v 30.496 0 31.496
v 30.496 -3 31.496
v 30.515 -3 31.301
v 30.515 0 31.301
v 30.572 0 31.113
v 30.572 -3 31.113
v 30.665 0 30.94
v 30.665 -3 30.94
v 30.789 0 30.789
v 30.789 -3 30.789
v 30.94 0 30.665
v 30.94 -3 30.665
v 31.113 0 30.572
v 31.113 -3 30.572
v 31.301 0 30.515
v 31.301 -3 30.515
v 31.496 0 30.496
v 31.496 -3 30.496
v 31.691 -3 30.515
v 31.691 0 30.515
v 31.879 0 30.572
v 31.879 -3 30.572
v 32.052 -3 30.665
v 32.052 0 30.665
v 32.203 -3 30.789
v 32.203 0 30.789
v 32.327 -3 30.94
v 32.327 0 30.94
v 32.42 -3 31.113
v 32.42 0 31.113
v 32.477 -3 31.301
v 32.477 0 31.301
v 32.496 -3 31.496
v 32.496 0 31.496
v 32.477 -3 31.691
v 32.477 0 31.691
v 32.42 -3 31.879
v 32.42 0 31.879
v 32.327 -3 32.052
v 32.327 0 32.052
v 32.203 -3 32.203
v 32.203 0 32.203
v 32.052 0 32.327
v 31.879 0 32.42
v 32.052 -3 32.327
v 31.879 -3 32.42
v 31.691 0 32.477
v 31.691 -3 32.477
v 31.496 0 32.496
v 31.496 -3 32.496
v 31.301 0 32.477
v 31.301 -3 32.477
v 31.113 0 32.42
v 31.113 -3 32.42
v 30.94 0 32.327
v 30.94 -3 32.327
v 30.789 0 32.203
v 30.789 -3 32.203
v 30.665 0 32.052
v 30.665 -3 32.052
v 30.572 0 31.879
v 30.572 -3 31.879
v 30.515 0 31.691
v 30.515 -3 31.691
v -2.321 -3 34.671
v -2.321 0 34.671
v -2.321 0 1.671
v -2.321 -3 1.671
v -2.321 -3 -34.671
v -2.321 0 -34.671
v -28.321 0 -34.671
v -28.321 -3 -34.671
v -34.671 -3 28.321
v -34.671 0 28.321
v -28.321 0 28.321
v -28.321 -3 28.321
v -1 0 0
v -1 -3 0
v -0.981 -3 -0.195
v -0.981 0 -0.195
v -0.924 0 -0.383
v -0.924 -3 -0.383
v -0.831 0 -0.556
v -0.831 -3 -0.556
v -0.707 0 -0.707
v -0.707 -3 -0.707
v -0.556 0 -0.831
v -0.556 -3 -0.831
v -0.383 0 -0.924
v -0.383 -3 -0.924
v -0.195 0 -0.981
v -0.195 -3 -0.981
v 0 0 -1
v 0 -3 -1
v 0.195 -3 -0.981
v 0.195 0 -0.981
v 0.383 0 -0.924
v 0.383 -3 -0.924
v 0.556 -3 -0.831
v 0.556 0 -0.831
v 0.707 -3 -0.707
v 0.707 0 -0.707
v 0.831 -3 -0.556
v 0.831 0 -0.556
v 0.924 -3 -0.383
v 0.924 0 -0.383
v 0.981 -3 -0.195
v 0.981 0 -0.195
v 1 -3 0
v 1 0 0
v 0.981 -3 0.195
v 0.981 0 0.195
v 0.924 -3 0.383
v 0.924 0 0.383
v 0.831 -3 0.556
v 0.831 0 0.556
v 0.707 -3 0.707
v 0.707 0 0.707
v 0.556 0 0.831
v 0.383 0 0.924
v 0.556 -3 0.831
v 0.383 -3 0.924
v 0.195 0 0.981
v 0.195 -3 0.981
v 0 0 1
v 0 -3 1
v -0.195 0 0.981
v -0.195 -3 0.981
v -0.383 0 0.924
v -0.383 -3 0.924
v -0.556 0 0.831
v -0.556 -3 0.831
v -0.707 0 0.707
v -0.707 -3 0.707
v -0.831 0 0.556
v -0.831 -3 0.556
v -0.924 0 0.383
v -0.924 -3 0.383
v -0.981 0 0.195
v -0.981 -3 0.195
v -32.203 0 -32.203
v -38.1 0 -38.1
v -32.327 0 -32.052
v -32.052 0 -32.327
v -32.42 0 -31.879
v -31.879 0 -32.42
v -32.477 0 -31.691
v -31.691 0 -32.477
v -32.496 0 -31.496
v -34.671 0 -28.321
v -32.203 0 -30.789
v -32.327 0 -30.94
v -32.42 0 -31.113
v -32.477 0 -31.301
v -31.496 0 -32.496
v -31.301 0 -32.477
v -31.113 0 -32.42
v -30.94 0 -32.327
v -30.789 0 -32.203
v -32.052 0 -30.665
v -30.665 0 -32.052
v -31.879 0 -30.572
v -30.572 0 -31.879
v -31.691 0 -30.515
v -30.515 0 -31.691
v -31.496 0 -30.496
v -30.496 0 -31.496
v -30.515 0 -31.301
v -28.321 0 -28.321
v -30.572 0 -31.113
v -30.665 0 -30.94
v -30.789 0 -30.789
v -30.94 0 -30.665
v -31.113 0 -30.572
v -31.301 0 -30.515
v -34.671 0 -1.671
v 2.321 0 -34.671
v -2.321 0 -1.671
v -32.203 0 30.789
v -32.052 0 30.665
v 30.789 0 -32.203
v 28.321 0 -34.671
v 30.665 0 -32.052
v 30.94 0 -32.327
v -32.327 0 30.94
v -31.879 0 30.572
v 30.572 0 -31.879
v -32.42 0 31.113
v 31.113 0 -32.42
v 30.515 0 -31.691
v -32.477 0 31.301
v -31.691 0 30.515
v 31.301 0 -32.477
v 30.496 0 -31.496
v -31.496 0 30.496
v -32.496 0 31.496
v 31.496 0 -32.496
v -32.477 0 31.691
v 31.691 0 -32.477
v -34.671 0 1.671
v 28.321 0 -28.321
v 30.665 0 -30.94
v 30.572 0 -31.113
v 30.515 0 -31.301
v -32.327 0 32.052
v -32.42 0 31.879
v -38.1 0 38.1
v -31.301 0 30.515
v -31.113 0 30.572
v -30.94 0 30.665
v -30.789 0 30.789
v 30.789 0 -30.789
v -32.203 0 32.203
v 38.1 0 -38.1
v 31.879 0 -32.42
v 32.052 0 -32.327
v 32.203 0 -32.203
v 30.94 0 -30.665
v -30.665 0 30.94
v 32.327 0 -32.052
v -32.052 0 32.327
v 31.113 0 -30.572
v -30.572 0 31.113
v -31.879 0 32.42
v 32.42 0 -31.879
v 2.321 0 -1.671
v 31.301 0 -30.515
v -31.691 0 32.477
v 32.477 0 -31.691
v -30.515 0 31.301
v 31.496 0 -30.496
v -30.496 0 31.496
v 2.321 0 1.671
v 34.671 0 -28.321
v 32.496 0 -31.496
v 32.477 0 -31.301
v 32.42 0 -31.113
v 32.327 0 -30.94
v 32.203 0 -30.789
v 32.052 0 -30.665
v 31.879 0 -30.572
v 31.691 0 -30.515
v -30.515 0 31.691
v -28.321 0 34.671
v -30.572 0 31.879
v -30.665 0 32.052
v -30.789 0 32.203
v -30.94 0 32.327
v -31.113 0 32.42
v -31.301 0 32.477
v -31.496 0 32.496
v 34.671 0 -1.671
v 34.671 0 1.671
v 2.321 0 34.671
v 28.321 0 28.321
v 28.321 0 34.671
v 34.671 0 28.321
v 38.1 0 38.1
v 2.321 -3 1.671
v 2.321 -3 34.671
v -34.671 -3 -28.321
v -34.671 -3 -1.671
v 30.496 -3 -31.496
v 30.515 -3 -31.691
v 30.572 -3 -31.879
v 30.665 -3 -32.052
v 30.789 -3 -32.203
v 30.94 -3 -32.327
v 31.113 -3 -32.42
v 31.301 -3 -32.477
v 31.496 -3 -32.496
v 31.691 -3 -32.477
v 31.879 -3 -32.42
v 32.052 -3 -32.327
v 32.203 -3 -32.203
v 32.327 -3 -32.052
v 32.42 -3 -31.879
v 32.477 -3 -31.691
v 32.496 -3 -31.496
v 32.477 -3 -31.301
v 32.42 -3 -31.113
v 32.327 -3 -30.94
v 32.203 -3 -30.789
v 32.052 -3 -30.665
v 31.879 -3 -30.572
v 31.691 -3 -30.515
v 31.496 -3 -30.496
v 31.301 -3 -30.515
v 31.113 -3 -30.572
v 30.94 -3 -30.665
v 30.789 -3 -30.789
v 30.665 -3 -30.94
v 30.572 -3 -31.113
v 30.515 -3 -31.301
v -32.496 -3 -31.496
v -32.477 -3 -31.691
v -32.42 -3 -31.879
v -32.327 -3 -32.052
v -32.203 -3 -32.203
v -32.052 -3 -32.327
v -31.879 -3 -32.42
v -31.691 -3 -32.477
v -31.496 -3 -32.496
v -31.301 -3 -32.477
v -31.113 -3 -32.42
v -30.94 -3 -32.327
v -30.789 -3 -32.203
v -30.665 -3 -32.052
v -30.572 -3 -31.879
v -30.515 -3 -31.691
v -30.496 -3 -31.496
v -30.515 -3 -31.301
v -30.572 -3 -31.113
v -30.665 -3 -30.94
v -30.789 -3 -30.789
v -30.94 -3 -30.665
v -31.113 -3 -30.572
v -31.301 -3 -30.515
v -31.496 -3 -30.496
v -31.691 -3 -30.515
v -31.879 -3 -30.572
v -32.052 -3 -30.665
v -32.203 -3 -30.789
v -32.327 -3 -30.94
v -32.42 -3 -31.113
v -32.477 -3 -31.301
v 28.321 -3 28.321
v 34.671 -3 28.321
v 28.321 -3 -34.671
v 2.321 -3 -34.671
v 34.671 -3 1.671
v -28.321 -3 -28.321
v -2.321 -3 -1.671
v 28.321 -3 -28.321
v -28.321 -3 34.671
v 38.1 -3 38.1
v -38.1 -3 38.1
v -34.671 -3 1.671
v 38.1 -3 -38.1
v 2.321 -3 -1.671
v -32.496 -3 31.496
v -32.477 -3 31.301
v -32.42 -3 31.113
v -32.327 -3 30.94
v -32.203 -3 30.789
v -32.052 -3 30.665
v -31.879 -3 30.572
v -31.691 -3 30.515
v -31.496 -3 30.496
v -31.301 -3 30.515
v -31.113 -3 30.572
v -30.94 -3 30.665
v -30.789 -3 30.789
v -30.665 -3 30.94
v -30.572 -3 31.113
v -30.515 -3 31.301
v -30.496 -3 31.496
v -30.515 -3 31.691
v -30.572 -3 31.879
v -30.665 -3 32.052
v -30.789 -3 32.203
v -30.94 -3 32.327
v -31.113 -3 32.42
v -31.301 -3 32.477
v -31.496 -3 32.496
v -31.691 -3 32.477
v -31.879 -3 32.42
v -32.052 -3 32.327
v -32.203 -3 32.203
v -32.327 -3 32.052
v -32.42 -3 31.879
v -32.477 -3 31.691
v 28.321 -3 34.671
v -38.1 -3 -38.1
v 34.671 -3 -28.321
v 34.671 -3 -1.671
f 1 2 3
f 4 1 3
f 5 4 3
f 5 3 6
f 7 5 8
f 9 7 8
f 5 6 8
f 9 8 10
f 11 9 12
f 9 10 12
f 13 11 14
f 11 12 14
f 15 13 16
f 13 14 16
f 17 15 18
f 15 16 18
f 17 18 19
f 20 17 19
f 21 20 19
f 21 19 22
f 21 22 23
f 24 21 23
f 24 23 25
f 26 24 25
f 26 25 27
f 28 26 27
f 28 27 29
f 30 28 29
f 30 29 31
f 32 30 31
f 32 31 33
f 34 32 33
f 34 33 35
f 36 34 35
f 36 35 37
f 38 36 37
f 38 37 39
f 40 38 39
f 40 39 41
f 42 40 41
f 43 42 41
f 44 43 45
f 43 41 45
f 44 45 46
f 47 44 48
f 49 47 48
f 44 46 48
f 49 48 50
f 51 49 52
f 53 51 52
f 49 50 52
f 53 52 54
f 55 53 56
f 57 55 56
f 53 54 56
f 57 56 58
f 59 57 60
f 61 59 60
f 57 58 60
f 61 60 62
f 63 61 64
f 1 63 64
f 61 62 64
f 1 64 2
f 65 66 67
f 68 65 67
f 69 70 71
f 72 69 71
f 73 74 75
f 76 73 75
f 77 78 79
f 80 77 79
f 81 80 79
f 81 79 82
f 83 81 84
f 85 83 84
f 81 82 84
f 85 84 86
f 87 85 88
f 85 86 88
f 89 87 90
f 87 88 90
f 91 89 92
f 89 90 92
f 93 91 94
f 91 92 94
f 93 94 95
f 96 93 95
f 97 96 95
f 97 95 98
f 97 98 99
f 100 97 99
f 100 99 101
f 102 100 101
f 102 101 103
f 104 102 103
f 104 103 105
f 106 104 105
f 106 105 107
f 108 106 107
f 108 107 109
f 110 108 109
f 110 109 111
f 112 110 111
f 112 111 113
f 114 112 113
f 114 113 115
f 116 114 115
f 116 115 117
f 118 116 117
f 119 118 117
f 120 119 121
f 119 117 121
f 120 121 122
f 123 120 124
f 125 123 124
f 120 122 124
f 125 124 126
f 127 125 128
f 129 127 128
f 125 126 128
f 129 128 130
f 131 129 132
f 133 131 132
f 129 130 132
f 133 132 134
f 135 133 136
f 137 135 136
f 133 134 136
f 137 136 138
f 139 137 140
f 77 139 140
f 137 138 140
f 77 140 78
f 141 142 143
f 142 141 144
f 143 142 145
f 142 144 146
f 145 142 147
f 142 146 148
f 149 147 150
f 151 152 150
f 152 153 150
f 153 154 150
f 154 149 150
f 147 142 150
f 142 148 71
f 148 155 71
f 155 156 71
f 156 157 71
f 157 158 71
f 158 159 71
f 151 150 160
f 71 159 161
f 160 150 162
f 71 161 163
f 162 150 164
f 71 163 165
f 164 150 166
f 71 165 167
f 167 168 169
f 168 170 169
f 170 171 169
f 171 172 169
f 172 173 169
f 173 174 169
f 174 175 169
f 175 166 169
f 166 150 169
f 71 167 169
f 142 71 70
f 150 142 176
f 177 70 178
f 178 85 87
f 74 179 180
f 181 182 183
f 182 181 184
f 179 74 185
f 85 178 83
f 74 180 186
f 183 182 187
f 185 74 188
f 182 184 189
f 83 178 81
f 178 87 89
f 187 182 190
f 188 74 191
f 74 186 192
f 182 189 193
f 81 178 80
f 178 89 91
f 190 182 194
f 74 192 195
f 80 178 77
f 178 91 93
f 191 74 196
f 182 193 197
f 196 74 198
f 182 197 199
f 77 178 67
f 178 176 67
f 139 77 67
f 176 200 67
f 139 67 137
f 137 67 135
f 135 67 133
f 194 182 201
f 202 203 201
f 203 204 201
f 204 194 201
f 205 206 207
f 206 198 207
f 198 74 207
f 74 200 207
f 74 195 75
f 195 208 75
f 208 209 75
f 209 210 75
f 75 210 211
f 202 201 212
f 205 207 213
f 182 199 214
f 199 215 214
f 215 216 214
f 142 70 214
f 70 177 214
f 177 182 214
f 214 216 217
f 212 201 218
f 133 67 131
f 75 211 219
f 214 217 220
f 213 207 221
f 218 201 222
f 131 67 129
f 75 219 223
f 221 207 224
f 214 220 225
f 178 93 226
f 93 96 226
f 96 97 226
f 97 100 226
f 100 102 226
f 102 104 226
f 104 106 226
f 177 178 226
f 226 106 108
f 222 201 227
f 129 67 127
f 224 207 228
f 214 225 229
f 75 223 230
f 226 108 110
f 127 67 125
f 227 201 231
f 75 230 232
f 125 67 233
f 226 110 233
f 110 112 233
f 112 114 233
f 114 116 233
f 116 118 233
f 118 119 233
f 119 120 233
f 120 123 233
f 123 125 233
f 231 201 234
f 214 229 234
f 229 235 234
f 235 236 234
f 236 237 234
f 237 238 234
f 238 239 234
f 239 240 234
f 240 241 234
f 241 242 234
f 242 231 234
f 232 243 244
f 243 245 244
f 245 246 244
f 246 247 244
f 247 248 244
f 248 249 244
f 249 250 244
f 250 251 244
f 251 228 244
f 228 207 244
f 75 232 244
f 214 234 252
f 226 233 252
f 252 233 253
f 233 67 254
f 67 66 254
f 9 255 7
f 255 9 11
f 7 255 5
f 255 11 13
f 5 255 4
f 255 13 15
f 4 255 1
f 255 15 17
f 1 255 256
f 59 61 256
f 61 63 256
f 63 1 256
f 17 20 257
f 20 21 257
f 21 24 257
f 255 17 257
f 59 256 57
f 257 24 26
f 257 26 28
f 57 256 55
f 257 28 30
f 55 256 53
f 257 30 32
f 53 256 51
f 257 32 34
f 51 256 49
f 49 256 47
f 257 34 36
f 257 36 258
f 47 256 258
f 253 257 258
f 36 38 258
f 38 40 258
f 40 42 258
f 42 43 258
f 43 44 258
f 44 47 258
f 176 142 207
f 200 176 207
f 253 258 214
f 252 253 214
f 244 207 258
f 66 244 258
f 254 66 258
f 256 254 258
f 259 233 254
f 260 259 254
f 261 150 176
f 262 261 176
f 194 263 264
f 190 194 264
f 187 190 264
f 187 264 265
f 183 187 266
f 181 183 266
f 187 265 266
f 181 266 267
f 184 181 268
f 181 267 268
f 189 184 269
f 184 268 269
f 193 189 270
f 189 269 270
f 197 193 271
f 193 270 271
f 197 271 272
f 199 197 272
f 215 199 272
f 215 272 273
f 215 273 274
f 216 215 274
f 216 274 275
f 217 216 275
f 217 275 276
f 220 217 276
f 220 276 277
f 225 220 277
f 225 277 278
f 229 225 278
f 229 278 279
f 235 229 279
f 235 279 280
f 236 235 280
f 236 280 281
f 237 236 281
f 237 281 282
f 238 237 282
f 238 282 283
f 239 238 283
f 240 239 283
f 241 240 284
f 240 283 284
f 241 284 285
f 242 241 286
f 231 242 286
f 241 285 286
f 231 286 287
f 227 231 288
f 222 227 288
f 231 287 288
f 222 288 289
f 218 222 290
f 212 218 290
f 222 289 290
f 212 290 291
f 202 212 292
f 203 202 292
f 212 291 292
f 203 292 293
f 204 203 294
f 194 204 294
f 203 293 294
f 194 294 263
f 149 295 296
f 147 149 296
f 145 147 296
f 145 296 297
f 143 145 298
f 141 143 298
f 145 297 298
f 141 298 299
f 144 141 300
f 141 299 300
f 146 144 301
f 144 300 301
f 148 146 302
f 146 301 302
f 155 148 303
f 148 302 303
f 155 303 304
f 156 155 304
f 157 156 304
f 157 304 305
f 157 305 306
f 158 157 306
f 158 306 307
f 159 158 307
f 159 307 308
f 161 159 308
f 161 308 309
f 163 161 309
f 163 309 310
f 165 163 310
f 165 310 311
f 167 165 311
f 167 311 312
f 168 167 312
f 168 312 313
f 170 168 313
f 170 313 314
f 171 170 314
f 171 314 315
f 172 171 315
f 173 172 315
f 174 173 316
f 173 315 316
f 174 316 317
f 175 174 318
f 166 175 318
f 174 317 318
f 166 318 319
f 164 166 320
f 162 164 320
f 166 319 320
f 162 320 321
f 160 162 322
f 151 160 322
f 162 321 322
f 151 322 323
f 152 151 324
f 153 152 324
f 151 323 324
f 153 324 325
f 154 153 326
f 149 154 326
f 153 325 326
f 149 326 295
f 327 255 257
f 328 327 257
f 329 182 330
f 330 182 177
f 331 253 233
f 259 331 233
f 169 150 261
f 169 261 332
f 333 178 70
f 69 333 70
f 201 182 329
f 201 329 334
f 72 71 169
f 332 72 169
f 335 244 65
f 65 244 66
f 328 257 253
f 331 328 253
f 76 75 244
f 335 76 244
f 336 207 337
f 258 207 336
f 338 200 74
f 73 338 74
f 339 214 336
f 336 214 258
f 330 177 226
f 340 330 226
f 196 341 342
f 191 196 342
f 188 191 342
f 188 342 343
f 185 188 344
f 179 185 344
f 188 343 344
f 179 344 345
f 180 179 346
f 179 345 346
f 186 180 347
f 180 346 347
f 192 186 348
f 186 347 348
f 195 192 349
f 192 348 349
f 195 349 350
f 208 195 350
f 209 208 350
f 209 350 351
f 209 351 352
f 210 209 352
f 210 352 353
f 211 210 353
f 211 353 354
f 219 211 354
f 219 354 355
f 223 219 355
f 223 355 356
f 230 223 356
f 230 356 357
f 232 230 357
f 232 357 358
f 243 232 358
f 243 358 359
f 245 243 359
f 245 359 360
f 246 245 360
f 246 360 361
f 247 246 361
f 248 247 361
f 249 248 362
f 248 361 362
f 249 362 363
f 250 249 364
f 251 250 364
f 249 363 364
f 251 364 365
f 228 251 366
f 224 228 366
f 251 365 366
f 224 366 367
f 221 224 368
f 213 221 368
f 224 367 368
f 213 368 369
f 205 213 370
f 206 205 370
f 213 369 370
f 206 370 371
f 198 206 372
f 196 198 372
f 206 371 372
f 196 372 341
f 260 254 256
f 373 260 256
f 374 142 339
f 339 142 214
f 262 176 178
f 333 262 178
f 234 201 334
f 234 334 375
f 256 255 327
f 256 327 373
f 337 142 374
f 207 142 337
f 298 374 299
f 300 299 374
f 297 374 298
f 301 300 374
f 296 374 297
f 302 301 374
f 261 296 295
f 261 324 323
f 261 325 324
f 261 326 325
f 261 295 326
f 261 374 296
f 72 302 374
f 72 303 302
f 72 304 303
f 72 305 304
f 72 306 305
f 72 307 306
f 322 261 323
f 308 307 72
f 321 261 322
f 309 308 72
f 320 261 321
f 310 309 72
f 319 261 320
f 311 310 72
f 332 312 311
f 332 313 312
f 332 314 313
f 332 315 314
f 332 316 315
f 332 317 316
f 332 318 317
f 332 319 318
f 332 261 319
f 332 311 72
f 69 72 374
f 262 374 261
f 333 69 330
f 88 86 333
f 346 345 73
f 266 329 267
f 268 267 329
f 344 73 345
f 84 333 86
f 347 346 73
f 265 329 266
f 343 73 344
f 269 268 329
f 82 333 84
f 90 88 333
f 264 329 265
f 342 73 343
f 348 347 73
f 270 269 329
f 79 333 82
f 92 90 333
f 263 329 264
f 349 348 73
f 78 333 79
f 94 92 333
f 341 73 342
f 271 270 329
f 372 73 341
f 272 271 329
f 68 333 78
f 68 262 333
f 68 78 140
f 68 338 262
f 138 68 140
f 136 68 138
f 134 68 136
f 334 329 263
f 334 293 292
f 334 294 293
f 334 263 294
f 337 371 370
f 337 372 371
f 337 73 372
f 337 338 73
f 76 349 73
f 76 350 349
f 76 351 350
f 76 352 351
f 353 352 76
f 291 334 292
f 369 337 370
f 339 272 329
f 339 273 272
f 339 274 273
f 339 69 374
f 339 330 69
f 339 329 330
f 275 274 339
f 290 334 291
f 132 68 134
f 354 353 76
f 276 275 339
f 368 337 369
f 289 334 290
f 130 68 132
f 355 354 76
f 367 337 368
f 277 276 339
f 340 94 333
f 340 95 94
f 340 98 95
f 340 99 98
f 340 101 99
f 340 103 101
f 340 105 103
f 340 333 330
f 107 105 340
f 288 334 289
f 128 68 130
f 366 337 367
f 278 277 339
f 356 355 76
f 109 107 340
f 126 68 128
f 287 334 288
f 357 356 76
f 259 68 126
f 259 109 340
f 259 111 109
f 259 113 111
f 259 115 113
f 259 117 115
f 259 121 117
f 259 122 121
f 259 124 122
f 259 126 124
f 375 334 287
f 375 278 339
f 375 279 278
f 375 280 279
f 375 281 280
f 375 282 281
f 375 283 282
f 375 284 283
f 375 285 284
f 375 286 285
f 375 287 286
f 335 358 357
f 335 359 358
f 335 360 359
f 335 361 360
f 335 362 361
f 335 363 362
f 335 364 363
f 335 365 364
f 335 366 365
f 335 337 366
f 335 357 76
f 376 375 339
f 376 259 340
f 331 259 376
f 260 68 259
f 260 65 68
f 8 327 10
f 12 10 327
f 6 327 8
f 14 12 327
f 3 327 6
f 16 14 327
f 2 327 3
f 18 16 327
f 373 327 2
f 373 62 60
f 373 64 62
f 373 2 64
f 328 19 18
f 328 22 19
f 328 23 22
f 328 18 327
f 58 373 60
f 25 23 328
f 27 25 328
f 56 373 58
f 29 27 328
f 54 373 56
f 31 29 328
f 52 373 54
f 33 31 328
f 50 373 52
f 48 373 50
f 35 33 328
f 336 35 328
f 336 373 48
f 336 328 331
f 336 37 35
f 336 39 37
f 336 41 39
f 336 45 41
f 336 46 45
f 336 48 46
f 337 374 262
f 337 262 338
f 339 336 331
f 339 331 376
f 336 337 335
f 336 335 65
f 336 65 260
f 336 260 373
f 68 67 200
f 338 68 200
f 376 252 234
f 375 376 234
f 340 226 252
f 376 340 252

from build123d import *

# Parameters (mm, degrees)
F0_W     = 76.2
F0_H     = 76.2
F0_W_2   = 6.35
F0_H_2   = 6.35
F1_DEPTH = 3
F2_D     = 2


with BuildPart() as f1:
    # F0 (on Front) → F1 (new body)
    with BuildSketch(Plane.XZ):
        Rectangle(F0_W, F0_H)
        Polygon((-34.671, -34.671), (-34.671, -28.321), (-34.671, -1.671), (-28.321, -1.671), (-2.321, -1.671), (-2.321, -34.671), (-28.321, -34.671), align=None, mode=Mode.SUBTRACT)
        Polygon((34.671, -1.671), (34.671, -28.321), (34.671, -34.671), (28.321, -34.671), (2.321, -34.671), (2.321, -1.671), (28.321, -1.671), align=None, mode=Mode.SUBTRACT)
        Polygon((-34.671, 34.671), (-28.321, 34.671), (-2.321, 34.671), (-2.321, 1.671), (-28.321, 1.671), (-34.671, 1.671), (-34.671, 28.321), align=None, mode=Mode.SUBTRACT)
        Polygon((28.321, 34.671), (34.671, 34.671), (34.671, 28.321), (34.671, 1.671), (28.321, 1.671), (2.321, 1.671), (2.321, 34.671), align=None, mode=Mode.SUBTRACT)
        with Locations((-31.496, 31.496)):
            Rectangle(F0_W_2, F0_H_2)
        with Locations((31.496, 31.496)):
            Rectangle(F0_W_2, F0_H_2)
        with Locations((-31.496, -31.496)):
            Rectangle(F0_W_2, F0_H_2)
        with Locations((31.496, -31.496)):
            Rectangle(F0_W_2, F0_H_2)
    extrude(amount=F1_DEPTH)

    # F2 (through all)
    with Locations(Plane(origin=(0, 0, 0), x_dir=(1, 0, 0), z_dir=(0, 1, 0))):
        with Locations((-31.496, 31.496), (31.496, 31.496), (0, 0), (-31.496, -31.496), (31.496, -31.496)):
            Hole(F2_D / 2)


solid = f1.part
